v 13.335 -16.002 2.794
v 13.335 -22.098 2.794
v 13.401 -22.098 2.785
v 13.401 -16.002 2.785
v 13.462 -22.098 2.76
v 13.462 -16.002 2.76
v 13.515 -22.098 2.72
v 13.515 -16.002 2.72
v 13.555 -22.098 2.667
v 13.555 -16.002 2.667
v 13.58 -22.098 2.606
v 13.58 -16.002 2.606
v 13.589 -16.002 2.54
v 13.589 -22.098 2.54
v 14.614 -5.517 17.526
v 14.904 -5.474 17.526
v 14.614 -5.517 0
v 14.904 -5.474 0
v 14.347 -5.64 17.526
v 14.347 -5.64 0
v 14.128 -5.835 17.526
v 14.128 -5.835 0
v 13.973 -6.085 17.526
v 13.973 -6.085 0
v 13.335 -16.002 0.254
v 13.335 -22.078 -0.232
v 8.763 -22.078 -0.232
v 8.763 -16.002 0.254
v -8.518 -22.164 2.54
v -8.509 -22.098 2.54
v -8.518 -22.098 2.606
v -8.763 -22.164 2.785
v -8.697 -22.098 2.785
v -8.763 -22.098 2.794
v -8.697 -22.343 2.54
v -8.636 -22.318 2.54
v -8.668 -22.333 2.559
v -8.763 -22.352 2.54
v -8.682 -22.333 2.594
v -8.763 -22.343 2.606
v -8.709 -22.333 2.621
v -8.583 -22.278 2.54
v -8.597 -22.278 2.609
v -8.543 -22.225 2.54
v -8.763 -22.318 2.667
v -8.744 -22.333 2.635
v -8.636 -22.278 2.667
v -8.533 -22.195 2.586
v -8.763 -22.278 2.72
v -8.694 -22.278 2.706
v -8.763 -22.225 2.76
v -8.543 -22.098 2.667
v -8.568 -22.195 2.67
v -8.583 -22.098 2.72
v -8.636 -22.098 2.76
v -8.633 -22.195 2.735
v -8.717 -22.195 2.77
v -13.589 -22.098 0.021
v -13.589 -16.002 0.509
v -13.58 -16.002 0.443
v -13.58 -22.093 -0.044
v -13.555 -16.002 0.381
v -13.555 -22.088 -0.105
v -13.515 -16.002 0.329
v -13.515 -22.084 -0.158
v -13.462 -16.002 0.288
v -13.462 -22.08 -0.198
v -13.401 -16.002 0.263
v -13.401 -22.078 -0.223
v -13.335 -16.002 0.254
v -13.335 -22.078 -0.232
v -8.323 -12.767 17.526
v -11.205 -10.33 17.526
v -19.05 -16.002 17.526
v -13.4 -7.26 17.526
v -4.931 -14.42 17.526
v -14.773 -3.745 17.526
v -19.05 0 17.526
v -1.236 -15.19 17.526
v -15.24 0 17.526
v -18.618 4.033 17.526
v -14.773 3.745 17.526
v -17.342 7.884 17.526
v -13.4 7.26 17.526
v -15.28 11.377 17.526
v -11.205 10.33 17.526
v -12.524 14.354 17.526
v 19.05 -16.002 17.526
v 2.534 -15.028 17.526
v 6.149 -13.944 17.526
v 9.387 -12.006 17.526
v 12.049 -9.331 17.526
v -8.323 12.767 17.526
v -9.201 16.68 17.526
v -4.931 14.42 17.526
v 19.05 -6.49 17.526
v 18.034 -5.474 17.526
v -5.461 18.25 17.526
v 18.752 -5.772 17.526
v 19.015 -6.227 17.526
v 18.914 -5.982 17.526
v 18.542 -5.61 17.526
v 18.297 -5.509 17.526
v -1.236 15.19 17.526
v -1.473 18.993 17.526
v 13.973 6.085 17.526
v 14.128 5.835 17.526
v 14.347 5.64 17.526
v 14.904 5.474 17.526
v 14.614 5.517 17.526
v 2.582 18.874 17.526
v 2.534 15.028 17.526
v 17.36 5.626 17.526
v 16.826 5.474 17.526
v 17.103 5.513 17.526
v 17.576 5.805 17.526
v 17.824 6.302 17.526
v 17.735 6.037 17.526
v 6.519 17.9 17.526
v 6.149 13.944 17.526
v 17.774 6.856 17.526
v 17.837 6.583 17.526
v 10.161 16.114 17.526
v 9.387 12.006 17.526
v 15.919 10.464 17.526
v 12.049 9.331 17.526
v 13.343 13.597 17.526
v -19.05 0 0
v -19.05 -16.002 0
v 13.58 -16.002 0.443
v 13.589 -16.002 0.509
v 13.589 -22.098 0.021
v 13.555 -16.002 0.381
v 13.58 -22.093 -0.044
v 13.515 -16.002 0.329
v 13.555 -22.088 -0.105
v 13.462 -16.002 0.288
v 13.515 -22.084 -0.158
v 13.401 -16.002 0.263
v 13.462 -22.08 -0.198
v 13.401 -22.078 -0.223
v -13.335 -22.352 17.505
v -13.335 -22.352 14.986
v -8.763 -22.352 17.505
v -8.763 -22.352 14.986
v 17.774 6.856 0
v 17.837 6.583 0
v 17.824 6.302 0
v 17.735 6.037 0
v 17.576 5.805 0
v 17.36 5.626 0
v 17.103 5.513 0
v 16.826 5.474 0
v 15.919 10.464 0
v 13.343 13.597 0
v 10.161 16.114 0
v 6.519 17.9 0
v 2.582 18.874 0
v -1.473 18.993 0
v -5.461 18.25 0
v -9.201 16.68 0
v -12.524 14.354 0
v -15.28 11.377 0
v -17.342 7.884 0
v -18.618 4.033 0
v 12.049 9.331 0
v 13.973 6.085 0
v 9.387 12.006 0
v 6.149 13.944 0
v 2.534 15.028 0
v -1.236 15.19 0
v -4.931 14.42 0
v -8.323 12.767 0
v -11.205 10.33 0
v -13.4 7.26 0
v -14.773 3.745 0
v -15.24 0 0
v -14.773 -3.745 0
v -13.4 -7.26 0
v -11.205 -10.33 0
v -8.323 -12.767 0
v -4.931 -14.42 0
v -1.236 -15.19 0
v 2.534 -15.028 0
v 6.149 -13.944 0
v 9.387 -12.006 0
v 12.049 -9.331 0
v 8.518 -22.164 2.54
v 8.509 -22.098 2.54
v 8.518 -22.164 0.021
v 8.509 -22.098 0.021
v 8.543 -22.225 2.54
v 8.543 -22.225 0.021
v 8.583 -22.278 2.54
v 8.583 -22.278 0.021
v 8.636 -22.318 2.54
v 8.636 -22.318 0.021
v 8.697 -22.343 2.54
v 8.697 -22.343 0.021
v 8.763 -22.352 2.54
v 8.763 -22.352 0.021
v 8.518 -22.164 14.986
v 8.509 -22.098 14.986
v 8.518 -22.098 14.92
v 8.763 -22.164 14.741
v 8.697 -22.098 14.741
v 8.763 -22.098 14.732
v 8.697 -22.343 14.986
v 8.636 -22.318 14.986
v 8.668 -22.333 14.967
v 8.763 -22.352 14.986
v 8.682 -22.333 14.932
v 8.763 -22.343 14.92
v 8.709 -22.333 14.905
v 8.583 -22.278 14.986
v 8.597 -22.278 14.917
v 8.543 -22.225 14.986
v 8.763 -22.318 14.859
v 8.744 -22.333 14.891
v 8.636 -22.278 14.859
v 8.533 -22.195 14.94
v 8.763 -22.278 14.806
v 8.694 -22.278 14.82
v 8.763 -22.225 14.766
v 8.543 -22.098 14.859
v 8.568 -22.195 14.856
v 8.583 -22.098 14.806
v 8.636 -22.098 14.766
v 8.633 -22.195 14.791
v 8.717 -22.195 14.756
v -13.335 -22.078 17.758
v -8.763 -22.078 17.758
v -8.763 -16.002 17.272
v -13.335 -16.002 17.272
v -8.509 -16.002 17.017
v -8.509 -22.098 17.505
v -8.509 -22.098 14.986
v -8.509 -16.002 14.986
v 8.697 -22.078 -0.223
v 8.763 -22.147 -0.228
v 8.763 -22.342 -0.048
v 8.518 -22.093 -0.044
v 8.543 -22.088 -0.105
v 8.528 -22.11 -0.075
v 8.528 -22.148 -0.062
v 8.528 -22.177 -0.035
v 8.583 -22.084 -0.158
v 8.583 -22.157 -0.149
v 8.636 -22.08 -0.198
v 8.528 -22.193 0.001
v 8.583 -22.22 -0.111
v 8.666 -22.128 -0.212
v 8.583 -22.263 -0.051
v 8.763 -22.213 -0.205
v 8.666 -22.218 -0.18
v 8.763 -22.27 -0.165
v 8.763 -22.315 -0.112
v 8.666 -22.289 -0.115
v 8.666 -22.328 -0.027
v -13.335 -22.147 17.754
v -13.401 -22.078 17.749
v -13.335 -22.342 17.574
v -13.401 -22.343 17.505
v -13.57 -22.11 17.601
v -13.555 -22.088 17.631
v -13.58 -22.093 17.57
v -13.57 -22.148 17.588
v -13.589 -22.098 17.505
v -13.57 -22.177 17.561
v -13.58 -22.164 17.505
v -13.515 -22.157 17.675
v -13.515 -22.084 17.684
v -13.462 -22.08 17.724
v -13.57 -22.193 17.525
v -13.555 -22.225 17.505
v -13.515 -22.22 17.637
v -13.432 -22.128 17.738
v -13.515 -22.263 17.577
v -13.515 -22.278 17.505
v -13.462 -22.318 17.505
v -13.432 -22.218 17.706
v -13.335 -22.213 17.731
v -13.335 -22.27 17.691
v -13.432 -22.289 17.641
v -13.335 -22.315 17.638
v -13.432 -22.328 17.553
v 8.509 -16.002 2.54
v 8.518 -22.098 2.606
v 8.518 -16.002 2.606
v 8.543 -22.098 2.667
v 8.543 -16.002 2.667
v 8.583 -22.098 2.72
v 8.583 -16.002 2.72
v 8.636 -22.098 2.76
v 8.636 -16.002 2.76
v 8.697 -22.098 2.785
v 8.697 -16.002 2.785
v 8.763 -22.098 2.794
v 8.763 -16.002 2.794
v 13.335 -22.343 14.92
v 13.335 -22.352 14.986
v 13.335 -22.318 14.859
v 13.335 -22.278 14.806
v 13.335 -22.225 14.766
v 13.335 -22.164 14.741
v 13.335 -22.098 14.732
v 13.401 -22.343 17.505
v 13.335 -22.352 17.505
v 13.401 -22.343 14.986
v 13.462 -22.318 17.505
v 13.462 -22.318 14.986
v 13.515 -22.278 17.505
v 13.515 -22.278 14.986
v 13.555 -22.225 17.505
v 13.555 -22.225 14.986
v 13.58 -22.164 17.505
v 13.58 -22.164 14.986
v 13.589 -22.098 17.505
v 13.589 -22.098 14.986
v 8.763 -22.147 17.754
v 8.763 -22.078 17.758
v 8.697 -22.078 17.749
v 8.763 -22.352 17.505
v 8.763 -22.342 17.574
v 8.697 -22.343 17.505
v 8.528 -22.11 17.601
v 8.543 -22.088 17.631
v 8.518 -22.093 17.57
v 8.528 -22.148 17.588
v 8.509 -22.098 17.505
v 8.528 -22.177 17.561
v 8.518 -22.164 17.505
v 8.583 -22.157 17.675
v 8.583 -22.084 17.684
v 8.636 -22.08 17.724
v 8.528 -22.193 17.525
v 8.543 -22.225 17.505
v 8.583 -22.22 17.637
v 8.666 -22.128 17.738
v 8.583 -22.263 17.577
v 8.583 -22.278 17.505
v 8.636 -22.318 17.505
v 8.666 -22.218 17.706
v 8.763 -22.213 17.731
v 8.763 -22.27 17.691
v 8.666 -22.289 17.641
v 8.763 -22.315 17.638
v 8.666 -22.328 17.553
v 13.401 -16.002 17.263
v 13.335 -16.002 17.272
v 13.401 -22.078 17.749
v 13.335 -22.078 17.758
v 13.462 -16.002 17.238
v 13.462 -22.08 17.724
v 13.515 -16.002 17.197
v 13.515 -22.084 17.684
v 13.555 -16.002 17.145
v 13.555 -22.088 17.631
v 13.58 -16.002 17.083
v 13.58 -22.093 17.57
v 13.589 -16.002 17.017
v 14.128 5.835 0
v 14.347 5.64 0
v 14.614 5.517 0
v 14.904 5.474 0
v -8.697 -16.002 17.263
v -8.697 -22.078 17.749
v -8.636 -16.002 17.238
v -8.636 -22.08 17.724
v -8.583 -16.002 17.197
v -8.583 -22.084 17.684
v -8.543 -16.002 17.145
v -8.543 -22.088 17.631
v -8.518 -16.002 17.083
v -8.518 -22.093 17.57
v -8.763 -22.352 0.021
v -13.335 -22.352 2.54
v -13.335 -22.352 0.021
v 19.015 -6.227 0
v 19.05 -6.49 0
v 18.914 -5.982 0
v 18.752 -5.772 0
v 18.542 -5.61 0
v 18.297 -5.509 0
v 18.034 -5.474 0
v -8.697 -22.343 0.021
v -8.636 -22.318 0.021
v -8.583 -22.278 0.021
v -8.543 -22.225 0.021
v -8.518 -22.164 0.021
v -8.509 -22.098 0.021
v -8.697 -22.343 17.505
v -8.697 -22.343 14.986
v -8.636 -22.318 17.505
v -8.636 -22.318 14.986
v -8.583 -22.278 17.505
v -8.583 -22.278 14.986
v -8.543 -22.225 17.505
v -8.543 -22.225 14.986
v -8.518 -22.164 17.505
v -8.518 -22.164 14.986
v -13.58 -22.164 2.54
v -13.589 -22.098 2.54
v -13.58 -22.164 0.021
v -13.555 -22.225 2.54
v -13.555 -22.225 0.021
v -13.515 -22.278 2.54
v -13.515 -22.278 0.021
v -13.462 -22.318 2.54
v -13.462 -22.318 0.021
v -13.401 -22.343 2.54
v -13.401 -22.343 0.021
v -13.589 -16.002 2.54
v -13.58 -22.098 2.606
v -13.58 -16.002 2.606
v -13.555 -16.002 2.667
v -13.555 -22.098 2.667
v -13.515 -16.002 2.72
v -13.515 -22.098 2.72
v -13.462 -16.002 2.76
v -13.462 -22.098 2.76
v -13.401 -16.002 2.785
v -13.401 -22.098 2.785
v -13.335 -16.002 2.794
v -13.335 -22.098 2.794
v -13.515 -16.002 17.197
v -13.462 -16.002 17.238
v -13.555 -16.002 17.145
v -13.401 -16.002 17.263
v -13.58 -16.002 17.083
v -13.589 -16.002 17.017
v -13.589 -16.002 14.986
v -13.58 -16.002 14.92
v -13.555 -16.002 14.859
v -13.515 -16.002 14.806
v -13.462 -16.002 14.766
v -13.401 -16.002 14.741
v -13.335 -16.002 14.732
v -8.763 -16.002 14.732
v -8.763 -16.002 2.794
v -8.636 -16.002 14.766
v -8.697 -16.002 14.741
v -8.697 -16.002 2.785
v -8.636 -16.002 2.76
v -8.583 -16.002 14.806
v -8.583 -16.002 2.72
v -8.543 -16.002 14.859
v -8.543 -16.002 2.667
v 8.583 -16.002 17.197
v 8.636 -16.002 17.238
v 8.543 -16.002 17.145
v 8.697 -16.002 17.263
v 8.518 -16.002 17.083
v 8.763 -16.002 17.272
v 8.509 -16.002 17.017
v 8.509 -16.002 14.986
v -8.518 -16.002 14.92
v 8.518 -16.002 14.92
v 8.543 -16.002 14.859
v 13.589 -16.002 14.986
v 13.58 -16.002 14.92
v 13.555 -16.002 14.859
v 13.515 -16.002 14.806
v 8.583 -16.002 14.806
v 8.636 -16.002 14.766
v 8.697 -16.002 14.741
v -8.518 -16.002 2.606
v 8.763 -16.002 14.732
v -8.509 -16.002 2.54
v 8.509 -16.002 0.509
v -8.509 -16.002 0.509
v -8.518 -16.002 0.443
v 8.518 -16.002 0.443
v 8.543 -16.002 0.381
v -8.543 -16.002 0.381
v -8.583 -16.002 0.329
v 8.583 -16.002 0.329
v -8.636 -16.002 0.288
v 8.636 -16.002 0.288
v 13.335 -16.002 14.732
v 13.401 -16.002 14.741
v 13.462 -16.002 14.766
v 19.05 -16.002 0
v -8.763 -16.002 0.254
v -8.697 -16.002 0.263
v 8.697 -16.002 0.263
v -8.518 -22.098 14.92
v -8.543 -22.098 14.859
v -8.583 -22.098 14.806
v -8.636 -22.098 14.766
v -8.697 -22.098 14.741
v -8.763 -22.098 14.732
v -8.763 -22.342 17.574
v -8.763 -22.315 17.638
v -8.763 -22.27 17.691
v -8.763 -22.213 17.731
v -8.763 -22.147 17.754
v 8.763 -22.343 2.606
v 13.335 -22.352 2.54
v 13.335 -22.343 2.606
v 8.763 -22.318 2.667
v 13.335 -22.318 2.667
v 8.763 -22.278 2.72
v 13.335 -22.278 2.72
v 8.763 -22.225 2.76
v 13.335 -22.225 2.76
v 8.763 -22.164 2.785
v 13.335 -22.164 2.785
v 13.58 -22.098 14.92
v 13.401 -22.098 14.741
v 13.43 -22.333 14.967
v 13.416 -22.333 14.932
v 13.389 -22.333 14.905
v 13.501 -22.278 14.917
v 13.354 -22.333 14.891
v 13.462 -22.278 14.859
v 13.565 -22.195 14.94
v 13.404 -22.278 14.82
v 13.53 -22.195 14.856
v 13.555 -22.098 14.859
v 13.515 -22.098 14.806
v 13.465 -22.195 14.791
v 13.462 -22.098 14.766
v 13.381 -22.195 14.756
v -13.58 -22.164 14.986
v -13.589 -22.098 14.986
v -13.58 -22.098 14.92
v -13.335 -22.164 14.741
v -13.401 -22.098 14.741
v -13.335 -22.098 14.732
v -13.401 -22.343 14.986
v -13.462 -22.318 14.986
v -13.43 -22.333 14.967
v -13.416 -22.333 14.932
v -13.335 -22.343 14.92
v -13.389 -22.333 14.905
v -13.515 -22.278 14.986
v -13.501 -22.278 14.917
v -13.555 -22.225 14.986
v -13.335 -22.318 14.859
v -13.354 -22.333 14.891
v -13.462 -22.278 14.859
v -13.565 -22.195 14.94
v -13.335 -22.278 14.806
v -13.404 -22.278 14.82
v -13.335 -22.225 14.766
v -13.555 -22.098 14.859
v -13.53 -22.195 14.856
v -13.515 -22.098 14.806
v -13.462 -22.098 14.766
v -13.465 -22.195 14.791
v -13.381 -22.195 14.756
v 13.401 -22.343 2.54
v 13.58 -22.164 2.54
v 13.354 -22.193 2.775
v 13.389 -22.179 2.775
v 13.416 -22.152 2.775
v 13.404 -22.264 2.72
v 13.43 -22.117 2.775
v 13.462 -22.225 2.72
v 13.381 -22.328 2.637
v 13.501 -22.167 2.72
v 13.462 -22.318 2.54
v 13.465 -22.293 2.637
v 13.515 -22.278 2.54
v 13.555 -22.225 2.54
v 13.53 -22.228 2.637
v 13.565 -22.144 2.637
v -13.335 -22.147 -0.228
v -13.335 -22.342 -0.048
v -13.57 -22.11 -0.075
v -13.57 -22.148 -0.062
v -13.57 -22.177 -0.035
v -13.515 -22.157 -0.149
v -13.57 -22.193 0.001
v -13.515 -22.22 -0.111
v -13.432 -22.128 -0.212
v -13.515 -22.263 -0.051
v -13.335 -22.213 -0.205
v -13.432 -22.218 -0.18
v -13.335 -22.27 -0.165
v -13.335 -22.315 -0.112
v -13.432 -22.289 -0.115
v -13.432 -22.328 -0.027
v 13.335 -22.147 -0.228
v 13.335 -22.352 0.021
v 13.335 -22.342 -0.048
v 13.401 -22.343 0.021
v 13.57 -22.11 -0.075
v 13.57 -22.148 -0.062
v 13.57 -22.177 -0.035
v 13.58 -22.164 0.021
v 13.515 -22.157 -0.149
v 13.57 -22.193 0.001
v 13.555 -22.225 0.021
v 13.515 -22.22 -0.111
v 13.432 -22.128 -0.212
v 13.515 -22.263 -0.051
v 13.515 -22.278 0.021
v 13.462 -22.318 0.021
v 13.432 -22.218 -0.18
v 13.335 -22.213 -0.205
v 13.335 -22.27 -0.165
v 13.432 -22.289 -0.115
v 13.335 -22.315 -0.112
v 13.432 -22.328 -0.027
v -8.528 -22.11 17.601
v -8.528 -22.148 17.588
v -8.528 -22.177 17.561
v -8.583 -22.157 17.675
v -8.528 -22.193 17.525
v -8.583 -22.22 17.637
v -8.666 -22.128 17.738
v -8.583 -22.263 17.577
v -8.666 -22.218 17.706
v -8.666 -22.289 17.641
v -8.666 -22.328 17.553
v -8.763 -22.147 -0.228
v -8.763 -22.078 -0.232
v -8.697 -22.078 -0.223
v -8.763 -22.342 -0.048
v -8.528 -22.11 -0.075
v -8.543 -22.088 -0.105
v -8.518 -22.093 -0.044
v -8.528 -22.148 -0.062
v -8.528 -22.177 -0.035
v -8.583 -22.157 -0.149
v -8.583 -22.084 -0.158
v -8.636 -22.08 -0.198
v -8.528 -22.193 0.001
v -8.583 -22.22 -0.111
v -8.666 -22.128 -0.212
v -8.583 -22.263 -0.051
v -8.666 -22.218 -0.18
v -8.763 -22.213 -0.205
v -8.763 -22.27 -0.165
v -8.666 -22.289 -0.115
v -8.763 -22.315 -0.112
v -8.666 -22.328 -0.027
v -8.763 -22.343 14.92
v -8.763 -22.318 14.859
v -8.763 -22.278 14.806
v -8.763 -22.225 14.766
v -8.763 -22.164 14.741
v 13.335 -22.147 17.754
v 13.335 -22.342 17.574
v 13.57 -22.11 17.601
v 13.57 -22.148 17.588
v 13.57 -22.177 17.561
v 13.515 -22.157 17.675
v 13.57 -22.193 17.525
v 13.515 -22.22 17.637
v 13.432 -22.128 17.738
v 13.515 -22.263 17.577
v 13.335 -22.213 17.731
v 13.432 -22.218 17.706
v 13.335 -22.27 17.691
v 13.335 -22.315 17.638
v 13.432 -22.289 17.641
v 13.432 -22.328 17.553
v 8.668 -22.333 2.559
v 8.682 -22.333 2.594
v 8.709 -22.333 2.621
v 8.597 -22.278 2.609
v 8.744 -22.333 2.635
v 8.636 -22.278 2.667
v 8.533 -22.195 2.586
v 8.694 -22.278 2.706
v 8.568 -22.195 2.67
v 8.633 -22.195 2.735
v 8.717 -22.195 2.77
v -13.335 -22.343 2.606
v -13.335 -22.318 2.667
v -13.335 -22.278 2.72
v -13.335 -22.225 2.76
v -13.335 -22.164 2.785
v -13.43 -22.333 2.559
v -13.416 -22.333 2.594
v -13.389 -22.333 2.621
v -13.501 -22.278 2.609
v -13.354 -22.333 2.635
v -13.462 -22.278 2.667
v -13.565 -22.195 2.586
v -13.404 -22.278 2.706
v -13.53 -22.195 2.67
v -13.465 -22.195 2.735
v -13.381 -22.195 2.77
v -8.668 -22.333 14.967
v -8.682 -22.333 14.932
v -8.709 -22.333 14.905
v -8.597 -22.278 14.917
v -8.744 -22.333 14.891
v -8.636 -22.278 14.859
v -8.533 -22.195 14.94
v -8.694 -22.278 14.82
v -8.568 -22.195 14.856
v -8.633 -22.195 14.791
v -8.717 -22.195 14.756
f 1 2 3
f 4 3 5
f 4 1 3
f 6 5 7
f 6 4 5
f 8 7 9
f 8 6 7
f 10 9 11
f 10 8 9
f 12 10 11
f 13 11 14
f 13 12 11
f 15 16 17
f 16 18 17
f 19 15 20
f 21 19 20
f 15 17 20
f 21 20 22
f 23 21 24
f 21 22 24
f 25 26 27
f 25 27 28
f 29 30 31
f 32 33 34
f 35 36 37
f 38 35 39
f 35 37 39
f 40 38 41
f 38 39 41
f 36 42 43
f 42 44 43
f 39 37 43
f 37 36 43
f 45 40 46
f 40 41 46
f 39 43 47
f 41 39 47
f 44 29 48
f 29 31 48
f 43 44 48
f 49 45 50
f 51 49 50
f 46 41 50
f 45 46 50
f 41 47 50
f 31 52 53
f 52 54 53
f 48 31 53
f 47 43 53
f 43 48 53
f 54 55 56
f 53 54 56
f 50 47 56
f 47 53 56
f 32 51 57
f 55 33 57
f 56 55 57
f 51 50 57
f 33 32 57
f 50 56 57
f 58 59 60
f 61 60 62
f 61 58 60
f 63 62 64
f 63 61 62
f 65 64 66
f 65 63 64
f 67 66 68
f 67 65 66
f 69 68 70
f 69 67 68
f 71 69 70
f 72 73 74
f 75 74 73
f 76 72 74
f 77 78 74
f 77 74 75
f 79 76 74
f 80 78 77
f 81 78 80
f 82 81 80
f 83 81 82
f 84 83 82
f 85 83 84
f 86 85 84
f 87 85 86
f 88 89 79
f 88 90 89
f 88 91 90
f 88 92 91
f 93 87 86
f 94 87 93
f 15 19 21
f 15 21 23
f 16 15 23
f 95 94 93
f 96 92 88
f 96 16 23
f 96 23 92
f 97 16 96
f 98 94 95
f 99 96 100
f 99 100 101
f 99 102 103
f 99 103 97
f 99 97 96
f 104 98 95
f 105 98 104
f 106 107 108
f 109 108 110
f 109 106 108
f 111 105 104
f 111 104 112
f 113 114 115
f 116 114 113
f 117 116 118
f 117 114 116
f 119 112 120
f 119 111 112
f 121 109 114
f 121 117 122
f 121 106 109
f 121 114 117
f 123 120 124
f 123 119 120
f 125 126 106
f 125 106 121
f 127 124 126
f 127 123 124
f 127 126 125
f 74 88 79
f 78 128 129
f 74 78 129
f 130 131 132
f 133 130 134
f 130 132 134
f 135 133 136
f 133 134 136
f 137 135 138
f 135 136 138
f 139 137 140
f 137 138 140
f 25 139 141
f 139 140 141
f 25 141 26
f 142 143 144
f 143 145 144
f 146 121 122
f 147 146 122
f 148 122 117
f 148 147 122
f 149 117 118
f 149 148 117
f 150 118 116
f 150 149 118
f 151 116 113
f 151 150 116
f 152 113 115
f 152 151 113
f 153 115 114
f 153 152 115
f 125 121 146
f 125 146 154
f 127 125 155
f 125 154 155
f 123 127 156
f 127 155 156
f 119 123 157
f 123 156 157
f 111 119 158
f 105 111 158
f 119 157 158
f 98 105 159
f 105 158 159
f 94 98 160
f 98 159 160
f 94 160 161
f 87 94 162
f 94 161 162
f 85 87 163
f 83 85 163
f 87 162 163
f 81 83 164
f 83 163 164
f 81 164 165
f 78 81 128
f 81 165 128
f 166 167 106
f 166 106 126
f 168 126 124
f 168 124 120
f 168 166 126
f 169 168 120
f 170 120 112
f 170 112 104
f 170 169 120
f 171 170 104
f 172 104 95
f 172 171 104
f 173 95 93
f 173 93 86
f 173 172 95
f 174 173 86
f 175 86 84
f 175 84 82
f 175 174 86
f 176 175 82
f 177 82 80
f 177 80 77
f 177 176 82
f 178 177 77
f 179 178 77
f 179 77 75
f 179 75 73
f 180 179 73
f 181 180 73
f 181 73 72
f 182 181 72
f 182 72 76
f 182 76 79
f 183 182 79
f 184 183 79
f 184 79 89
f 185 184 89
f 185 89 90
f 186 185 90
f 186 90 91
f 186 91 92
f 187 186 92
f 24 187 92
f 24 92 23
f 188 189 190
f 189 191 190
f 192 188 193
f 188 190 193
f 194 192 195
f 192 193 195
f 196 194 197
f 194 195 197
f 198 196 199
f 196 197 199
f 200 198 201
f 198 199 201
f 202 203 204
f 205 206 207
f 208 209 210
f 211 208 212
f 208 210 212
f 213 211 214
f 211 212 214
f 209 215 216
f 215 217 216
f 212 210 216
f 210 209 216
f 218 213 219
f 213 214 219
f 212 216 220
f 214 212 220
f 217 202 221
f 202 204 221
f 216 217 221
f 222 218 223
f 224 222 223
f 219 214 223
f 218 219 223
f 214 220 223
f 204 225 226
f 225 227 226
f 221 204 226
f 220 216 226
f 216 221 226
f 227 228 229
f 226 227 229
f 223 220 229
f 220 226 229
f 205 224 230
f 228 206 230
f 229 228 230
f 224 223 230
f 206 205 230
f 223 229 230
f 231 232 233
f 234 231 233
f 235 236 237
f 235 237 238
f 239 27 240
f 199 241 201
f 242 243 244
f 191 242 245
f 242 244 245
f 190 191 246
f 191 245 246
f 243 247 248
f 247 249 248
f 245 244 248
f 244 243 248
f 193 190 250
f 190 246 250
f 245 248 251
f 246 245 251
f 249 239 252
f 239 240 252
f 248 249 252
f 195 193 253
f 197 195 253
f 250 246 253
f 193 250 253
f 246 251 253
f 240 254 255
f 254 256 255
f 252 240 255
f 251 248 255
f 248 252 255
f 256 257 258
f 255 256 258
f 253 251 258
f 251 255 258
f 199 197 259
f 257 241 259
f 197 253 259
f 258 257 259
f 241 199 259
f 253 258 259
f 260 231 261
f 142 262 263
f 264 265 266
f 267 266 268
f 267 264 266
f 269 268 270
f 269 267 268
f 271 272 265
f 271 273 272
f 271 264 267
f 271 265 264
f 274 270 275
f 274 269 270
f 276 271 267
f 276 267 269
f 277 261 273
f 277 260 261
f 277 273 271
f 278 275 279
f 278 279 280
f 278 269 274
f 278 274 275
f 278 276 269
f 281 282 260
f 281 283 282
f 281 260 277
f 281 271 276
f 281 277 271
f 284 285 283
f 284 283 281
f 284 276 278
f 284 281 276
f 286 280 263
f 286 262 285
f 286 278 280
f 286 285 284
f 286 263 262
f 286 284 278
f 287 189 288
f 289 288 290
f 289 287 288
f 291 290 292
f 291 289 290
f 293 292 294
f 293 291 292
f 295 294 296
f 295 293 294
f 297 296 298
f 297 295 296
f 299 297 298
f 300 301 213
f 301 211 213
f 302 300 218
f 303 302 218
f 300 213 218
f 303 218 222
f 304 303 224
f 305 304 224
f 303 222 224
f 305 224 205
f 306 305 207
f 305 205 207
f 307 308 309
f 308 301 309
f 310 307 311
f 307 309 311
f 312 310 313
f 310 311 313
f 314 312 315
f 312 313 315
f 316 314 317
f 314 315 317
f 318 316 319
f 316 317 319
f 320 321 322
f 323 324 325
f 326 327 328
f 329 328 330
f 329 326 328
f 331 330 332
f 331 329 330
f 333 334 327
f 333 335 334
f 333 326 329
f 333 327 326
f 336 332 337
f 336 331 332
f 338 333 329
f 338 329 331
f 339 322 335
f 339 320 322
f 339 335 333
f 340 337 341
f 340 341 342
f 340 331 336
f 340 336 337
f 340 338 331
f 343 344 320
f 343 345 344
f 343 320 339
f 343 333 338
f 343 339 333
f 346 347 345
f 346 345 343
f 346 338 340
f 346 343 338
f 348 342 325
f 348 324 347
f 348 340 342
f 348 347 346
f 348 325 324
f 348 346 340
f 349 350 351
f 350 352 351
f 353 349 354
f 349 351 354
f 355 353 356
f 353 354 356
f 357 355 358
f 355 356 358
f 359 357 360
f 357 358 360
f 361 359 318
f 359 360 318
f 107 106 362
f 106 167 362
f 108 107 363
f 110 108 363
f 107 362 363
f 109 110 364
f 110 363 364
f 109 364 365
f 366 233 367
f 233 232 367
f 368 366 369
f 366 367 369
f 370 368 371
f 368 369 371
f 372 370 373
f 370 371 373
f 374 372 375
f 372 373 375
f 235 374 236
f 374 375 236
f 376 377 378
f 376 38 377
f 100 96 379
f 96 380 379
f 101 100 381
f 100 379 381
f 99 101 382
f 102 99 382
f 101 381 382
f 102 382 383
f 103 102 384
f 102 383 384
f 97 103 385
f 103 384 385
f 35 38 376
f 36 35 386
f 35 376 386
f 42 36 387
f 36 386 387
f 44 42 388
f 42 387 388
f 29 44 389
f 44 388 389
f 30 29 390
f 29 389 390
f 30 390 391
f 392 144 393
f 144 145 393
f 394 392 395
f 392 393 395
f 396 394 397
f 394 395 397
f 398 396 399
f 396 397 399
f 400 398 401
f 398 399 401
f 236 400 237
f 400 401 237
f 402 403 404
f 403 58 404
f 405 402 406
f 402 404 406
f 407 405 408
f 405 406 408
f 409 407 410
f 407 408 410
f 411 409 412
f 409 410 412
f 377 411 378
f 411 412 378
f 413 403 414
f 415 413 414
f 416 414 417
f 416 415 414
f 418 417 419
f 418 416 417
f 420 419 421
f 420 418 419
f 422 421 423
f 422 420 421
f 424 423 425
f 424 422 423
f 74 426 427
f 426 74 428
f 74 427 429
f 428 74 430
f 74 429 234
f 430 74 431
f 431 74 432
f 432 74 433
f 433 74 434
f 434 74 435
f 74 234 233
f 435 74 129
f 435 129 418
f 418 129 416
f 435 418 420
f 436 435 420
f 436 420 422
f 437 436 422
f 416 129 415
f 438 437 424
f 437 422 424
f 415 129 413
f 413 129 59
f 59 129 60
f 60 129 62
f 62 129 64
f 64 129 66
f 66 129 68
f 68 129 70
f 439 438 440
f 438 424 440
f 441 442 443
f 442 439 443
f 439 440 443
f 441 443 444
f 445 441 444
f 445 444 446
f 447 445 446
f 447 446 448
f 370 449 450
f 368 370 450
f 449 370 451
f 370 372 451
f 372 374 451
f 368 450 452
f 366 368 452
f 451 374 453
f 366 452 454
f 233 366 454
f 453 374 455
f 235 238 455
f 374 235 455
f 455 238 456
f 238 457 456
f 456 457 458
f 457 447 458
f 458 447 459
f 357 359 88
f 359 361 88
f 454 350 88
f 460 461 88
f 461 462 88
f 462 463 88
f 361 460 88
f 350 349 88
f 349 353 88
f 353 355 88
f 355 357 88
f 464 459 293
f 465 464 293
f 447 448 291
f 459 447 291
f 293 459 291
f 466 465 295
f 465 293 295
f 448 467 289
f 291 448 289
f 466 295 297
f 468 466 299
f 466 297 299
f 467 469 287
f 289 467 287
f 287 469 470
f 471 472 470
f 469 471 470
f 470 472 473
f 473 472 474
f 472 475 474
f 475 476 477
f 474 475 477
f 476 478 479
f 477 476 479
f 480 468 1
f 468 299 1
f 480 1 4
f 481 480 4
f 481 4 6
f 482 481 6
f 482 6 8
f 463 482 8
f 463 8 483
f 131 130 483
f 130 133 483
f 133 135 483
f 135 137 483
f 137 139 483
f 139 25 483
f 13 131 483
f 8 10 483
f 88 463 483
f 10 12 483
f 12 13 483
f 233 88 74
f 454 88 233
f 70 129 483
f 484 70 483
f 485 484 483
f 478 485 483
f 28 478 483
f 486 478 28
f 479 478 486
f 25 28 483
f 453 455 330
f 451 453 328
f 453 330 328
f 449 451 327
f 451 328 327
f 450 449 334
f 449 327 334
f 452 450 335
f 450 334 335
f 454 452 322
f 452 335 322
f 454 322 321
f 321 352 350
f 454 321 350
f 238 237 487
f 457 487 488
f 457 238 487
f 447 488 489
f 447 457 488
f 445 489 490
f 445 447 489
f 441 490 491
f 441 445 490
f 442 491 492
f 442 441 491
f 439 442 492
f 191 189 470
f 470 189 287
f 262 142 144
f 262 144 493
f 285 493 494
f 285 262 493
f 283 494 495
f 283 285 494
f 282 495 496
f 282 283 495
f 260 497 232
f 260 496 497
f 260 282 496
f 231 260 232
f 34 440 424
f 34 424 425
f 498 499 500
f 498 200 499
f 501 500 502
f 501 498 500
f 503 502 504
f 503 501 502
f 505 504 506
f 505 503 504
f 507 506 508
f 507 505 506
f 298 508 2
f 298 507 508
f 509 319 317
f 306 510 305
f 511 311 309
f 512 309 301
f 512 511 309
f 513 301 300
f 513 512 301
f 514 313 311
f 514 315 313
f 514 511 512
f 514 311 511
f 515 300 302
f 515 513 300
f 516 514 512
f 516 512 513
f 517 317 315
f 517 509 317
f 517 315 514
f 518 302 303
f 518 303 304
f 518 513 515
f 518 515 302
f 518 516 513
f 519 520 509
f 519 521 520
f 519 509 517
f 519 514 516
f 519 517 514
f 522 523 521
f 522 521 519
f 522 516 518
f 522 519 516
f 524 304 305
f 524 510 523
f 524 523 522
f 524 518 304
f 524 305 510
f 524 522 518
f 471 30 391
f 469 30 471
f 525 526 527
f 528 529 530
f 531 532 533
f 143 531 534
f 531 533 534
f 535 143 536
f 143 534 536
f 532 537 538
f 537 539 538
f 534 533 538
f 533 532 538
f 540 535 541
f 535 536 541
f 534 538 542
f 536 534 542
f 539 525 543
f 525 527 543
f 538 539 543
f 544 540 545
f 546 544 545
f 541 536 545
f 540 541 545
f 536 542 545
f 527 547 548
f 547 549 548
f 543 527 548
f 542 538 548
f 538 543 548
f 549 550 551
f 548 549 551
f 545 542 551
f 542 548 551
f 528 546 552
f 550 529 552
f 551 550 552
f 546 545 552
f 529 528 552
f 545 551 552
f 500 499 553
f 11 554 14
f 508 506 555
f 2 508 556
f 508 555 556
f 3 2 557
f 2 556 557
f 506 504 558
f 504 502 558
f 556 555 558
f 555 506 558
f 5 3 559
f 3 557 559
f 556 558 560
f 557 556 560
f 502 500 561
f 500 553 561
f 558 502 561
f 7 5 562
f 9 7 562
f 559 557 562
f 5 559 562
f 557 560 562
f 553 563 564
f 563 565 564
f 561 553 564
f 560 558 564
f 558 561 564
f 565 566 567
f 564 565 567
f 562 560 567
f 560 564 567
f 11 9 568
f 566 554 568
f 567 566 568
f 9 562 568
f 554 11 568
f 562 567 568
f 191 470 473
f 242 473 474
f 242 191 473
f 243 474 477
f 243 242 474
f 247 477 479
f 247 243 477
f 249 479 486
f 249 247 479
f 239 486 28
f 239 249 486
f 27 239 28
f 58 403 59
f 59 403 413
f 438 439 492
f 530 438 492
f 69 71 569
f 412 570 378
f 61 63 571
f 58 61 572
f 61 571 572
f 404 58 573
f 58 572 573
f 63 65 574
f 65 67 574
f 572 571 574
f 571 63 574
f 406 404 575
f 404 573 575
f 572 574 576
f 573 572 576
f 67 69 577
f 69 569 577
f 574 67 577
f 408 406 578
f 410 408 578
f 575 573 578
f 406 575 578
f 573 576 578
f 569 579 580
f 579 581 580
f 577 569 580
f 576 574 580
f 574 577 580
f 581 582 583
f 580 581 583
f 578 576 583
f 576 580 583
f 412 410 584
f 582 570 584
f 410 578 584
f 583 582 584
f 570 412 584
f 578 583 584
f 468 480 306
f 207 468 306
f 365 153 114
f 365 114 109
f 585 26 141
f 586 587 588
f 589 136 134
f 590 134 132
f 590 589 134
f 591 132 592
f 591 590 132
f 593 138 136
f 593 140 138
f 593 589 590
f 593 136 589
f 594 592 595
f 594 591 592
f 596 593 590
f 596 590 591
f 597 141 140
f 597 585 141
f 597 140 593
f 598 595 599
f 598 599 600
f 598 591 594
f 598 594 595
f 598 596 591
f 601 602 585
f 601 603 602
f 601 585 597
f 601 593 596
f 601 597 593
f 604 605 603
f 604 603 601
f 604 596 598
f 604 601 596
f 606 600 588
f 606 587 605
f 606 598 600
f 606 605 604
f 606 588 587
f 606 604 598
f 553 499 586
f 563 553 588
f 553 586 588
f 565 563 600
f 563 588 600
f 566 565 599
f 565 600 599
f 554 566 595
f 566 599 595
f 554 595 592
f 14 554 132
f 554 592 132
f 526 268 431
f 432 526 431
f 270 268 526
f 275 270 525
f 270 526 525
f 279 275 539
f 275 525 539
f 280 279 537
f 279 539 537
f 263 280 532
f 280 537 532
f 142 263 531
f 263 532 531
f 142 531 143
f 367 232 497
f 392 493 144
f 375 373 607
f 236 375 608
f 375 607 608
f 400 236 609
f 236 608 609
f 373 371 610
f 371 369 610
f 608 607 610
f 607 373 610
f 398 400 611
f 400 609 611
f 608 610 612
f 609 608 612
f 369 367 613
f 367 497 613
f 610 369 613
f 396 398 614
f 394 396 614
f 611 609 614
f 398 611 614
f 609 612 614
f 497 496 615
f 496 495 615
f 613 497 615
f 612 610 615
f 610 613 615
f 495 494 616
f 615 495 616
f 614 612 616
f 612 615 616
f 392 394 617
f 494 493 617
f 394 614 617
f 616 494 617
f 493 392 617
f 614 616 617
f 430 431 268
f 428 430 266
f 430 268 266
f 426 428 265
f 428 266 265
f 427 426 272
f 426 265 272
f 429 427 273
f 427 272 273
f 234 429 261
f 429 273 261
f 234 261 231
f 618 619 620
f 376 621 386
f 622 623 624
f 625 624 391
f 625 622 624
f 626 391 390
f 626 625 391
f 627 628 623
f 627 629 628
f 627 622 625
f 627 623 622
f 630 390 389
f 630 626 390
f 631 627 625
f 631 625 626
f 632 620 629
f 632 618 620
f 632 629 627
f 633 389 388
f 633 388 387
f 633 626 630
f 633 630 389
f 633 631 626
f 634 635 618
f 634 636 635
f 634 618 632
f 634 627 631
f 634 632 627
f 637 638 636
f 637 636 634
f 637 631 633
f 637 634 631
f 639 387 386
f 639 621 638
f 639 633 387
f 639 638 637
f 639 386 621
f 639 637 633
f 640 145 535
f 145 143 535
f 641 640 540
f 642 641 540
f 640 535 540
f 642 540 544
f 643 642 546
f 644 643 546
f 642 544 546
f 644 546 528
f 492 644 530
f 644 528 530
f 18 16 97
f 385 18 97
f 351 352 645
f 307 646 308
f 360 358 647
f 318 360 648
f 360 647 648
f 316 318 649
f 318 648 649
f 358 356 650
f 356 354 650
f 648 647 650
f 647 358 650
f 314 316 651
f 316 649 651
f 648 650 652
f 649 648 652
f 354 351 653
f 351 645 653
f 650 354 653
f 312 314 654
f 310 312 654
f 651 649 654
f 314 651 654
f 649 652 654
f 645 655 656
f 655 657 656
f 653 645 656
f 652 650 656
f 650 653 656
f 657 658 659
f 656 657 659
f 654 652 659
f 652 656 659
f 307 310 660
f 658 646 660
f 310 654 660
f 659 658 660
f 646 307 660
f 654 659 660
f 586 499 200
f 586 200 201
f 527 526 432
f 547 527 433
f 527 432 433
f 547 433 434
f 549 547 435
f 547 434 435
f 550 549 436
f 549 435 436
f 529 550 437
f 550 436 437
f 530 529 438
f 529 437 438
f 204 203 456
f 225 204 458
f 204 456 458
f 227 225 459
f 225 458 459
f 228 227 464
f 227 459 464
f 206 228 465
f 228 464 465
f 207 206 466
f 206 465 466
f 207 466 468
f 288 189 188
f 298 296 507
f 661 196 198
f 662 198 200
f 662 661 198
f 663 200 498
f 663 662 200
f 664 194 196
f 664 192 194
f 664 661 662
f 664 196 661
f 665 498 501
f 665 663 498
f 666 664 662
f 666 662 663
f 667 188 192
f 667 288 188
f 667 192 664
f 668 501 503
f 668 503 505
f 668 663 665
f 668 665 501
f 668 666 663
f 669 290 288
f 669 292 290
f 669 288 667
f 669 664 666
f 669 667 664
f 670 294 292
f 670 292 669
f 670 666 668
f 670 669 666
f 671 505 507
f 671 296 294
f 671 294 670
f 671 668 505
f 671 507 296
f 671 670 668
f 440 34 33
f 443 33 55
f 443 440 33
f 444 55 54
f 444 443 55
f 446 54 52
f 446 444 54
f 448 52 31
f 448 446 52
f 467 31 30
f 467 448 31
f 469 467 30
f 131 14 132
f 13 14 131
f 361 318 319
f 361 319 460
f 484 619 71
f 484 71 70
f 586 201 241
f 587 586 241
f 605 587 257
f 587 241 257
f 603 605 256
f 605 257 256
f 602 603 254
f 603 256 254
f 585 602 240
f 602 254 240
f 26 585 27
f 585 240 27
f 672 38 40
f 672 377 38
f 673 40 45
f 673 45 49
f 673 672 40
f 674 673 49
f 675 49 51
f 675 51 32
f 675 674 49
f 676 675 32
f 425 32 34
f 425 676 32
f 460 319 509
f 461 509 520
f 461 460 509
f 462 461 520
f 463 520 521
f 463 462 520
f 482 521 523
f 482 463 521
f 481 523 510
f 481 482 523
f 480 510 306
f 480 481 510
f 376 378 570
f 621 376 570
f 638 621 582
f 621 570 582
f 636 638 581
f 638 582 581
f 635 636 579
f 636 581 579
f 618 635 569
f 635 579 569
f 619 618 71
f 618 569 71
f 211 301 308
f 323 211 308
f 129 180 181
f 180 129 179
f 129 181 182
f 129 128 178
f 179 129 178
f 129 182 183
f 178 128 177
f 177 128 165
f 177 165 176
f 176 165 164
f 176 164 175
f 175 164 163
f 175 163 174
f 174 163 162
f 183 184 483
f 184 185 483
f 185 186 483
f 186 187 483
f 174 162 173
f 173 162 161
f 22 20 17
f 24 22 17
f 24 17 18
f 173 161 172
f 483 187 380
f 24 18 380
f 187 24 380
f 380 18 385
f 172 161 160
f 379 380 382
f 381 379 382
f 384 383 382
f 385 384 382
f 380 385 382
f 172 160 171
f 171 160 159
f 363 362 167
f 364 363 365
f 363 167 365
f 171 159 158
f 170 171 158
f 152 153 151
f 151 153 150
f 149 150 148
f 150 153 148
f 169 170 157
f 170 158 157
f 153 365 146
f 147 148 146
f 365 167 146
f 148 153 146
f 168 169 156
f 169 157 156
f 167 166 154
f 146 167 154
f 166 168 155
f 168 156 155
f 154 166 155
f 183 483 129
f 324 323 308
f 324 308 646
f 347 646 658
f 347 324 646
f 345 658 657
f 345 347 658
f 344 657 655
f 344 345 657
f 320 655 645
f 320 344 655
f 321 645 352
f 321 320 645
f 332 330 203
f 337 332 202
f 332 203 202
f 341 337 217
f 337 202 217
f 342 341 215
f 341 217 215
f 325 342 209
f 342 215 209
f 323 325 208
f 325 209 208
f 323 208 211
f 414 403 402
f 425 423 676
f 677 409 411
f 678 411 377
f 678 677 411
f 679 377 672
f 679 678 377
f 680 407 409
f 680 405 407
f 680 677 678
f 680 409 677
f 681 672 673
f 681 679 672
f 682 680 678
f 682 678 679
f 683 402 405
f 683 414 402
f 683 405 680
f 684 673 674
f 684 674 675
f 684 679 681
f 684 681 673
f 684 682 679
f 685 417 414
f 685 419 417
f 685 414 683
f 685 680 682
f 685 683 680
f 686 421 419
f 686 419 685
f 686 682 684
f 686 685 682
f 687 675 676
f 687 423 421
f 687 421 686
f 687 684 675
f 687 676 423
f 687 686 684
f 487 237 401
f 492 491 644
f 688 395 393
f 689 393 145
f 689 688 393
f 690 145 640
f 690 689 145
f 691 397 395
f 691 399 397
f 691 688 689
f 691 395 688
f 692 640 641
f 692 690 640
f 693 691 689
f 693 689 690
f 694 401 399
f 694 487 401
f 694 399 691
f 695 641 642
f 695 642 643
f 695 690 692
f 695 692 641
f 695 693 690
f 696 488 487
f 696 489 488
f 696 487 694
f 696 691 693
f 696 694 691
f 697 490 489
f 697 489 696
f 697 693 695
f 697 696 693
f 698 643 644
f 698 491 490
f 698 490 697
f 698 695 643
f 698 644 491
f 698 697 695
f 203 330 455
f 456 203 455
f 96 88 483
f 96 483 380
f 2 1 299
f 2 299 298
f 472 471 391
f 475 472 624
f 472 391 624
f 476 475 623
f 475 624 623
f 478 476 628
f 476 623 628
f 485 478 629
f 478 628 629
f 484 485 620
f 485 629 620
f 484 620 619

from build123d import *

# Parameters (mm, degrees)
SKETCH1_R               = 15.24
BOSS_EXTRUDE1_DEPTH     = 17.526
CUT_EXTRUDE2_DEPTH      = 33.139783384
BOSS_EXTRUDE2_DEPTH     = 38.1
CUT_EXTRUDE1_DEPTH      = 35.33136764
CUT_EXTRUDE1_DEPTH_BACK = 35.33136764
SKETCH4_W               = 17.018
SKETCH4_H               = 6.35
SKETCH4_W_2             = 5.461
FILLET1_R               = 0.254
FILLET2_R               = 1.016


with BuildPart() as part:
    # Sketch1 → Boss-Extrude1 (new body)
    with BuildSketch(Plane.XY):
        with BuildLine():
            Line((-19.05, 0), (-19.05, -16.002))
            Line((-19.05, -16.002), (19.05, -16.002))
            Line((19.05, -16.002), (19.05, 0))
            ThreePointArc((19.05, 0), (0, 19.05), (-19.05, 0))
        make_face()
        Circle(SKETCH1_R, mode=Mode.SUBTRACT)
    extrude(amount=BOSS_EXTRUDE1_DEPTH)

    # Sketch5 → Cut-Extrude2 (cut, through all)
    with BuildSketch(Plane.XY.offset(17.526)):
        with BuildLine():
            Line((19.05, -5.474194202), (19.05, 0))
            ThreePointArc((19.05, 0), (18.848061086, 2.766422474), (18.246525637, 5.474194202))
            Line((18.246525637, 5.474194202), (14.222896957, 5.474194202))
            ThreePointArc((14.222896957, 5.474194202), (15.24, 0), (14.222896957, -5.474194202))
            Line((14.222896957, -5.474194202), (19.05, -5.474194202))
        make_face()
    extrude(amount=-CUT_EXTRUDE2_DEPTH, mode=Mode.SUBTRACT)

    # Sketch3 → Boss-Extrude2 (add)
    with BuildSketch(Plane(origin=(19.05, 0, 0), x_dir=(0, 0, -1), z_dir=(1, 0, 0))):
        Polygon((-2.794, -16.002), (-2.794, -22.352), (0.254, -22.352), (-0.254, -16.002), align=None)
        Polygon((-14.732, -16.002), (-14.732, -22.352), (-17.78, -22.352), (-17.272, -16.002), align=None)
    extrude(amount=-BOSS_EXTRUDE2_DEPTH)

    # Sketch4 → Cut-Extrude1 (cut, two sides: drawn at the far end of the back side and taken through both)
    with BuildSketch(Plane(origin=(0, 0, 0), x_dir=(-1, 0, 0), z_dir=(0, 0, -1)).offset(-CUT_EXTRUDE1_DEPTH_BACK)):
        with Locations((0, -19.177)):
            Rectangle(SKETCH4_W, SKETCH4_H)
        with Locations((16.3195, -19.177)):
            Rectangle(SKETCH4_W_2, SKETCH4_H)
        with Locations((-16.3195, -19.177)):
            Rectangle(SKETCH4_W_2, SKETCH4_H)
    extrude(amount=CUT_EXTRUDE1_DEPTH + CUT_EXTRUDE1_DEPTH_BACK, mode=Mode.SUBTRACT)

    # Fillet1
    fillet1_edges = [part.edges().sort_by_distance(p)[0] for p in [
        (13.589, -19.177, 14.732),
        (13.589, -22.352, 1.27),
        (13.589, -22.352, 16.256),
        (-13.589, -19.177, 0),
        (-13.589, -19.177, 2.794),
        (-13.589, -19.177, 14.732),
        (-13.589, -22.352, 1.27),
        (-13.589, -22.352, 16.256),
        (8.509, -19.177, 0),
        (8.509, -19.177, 2.794),
        (8.509, -19.177, 14.732),
        (8.509, -22.352, 1.27),
        (-8.509, -19.177, 0),
        (-8.509, -19.177, 2.794),
        (-8.509, -19.177, 14.732),
        (-8.509, -22.352, 1.27),
        (8.509, -22.352, 16.256),
        (-8.509, -22.352, 16.256),
        (-11.049, -22.352, 17.78),
        (11.049, -22.352, 17.78),
        (-8.509, -19.177, 17.526),
        (8.509, -19.177, 17.526),
        (-13.589, -19.177, 17.526),
        (13.589, -19.177, 17.526),
        (-11.049, -22.352, 14.732),
        (11.049, -22.352, 14.732),
        (-11.049, -22.352, 2.794),
        (11.049, -22.352, 2.794),
        (-11.049, -22.352, -0.254),
        (11.049, -22.352, -0.254),
        (13.589, -19.177, 0),
        (13.589, -19.177, 2.794),
    ]]
    fillet(fillet1_edges, radius=FILLET1_R)

    # Fillet2
    fillet2_edges = [part.edges().sort_by_distance(p)[0] for p in [
        (18.246525637, 5.474194202, 8.763),
        (19.05, -5.474194202, 8.763),
        (14.222896957, -5.474194202, 8.763),
        (14.222896957, 5.474194202, 8.763),
    ]]
    fillet(fillet2_edges, radius=FILLET2_R)


solid = part.part
